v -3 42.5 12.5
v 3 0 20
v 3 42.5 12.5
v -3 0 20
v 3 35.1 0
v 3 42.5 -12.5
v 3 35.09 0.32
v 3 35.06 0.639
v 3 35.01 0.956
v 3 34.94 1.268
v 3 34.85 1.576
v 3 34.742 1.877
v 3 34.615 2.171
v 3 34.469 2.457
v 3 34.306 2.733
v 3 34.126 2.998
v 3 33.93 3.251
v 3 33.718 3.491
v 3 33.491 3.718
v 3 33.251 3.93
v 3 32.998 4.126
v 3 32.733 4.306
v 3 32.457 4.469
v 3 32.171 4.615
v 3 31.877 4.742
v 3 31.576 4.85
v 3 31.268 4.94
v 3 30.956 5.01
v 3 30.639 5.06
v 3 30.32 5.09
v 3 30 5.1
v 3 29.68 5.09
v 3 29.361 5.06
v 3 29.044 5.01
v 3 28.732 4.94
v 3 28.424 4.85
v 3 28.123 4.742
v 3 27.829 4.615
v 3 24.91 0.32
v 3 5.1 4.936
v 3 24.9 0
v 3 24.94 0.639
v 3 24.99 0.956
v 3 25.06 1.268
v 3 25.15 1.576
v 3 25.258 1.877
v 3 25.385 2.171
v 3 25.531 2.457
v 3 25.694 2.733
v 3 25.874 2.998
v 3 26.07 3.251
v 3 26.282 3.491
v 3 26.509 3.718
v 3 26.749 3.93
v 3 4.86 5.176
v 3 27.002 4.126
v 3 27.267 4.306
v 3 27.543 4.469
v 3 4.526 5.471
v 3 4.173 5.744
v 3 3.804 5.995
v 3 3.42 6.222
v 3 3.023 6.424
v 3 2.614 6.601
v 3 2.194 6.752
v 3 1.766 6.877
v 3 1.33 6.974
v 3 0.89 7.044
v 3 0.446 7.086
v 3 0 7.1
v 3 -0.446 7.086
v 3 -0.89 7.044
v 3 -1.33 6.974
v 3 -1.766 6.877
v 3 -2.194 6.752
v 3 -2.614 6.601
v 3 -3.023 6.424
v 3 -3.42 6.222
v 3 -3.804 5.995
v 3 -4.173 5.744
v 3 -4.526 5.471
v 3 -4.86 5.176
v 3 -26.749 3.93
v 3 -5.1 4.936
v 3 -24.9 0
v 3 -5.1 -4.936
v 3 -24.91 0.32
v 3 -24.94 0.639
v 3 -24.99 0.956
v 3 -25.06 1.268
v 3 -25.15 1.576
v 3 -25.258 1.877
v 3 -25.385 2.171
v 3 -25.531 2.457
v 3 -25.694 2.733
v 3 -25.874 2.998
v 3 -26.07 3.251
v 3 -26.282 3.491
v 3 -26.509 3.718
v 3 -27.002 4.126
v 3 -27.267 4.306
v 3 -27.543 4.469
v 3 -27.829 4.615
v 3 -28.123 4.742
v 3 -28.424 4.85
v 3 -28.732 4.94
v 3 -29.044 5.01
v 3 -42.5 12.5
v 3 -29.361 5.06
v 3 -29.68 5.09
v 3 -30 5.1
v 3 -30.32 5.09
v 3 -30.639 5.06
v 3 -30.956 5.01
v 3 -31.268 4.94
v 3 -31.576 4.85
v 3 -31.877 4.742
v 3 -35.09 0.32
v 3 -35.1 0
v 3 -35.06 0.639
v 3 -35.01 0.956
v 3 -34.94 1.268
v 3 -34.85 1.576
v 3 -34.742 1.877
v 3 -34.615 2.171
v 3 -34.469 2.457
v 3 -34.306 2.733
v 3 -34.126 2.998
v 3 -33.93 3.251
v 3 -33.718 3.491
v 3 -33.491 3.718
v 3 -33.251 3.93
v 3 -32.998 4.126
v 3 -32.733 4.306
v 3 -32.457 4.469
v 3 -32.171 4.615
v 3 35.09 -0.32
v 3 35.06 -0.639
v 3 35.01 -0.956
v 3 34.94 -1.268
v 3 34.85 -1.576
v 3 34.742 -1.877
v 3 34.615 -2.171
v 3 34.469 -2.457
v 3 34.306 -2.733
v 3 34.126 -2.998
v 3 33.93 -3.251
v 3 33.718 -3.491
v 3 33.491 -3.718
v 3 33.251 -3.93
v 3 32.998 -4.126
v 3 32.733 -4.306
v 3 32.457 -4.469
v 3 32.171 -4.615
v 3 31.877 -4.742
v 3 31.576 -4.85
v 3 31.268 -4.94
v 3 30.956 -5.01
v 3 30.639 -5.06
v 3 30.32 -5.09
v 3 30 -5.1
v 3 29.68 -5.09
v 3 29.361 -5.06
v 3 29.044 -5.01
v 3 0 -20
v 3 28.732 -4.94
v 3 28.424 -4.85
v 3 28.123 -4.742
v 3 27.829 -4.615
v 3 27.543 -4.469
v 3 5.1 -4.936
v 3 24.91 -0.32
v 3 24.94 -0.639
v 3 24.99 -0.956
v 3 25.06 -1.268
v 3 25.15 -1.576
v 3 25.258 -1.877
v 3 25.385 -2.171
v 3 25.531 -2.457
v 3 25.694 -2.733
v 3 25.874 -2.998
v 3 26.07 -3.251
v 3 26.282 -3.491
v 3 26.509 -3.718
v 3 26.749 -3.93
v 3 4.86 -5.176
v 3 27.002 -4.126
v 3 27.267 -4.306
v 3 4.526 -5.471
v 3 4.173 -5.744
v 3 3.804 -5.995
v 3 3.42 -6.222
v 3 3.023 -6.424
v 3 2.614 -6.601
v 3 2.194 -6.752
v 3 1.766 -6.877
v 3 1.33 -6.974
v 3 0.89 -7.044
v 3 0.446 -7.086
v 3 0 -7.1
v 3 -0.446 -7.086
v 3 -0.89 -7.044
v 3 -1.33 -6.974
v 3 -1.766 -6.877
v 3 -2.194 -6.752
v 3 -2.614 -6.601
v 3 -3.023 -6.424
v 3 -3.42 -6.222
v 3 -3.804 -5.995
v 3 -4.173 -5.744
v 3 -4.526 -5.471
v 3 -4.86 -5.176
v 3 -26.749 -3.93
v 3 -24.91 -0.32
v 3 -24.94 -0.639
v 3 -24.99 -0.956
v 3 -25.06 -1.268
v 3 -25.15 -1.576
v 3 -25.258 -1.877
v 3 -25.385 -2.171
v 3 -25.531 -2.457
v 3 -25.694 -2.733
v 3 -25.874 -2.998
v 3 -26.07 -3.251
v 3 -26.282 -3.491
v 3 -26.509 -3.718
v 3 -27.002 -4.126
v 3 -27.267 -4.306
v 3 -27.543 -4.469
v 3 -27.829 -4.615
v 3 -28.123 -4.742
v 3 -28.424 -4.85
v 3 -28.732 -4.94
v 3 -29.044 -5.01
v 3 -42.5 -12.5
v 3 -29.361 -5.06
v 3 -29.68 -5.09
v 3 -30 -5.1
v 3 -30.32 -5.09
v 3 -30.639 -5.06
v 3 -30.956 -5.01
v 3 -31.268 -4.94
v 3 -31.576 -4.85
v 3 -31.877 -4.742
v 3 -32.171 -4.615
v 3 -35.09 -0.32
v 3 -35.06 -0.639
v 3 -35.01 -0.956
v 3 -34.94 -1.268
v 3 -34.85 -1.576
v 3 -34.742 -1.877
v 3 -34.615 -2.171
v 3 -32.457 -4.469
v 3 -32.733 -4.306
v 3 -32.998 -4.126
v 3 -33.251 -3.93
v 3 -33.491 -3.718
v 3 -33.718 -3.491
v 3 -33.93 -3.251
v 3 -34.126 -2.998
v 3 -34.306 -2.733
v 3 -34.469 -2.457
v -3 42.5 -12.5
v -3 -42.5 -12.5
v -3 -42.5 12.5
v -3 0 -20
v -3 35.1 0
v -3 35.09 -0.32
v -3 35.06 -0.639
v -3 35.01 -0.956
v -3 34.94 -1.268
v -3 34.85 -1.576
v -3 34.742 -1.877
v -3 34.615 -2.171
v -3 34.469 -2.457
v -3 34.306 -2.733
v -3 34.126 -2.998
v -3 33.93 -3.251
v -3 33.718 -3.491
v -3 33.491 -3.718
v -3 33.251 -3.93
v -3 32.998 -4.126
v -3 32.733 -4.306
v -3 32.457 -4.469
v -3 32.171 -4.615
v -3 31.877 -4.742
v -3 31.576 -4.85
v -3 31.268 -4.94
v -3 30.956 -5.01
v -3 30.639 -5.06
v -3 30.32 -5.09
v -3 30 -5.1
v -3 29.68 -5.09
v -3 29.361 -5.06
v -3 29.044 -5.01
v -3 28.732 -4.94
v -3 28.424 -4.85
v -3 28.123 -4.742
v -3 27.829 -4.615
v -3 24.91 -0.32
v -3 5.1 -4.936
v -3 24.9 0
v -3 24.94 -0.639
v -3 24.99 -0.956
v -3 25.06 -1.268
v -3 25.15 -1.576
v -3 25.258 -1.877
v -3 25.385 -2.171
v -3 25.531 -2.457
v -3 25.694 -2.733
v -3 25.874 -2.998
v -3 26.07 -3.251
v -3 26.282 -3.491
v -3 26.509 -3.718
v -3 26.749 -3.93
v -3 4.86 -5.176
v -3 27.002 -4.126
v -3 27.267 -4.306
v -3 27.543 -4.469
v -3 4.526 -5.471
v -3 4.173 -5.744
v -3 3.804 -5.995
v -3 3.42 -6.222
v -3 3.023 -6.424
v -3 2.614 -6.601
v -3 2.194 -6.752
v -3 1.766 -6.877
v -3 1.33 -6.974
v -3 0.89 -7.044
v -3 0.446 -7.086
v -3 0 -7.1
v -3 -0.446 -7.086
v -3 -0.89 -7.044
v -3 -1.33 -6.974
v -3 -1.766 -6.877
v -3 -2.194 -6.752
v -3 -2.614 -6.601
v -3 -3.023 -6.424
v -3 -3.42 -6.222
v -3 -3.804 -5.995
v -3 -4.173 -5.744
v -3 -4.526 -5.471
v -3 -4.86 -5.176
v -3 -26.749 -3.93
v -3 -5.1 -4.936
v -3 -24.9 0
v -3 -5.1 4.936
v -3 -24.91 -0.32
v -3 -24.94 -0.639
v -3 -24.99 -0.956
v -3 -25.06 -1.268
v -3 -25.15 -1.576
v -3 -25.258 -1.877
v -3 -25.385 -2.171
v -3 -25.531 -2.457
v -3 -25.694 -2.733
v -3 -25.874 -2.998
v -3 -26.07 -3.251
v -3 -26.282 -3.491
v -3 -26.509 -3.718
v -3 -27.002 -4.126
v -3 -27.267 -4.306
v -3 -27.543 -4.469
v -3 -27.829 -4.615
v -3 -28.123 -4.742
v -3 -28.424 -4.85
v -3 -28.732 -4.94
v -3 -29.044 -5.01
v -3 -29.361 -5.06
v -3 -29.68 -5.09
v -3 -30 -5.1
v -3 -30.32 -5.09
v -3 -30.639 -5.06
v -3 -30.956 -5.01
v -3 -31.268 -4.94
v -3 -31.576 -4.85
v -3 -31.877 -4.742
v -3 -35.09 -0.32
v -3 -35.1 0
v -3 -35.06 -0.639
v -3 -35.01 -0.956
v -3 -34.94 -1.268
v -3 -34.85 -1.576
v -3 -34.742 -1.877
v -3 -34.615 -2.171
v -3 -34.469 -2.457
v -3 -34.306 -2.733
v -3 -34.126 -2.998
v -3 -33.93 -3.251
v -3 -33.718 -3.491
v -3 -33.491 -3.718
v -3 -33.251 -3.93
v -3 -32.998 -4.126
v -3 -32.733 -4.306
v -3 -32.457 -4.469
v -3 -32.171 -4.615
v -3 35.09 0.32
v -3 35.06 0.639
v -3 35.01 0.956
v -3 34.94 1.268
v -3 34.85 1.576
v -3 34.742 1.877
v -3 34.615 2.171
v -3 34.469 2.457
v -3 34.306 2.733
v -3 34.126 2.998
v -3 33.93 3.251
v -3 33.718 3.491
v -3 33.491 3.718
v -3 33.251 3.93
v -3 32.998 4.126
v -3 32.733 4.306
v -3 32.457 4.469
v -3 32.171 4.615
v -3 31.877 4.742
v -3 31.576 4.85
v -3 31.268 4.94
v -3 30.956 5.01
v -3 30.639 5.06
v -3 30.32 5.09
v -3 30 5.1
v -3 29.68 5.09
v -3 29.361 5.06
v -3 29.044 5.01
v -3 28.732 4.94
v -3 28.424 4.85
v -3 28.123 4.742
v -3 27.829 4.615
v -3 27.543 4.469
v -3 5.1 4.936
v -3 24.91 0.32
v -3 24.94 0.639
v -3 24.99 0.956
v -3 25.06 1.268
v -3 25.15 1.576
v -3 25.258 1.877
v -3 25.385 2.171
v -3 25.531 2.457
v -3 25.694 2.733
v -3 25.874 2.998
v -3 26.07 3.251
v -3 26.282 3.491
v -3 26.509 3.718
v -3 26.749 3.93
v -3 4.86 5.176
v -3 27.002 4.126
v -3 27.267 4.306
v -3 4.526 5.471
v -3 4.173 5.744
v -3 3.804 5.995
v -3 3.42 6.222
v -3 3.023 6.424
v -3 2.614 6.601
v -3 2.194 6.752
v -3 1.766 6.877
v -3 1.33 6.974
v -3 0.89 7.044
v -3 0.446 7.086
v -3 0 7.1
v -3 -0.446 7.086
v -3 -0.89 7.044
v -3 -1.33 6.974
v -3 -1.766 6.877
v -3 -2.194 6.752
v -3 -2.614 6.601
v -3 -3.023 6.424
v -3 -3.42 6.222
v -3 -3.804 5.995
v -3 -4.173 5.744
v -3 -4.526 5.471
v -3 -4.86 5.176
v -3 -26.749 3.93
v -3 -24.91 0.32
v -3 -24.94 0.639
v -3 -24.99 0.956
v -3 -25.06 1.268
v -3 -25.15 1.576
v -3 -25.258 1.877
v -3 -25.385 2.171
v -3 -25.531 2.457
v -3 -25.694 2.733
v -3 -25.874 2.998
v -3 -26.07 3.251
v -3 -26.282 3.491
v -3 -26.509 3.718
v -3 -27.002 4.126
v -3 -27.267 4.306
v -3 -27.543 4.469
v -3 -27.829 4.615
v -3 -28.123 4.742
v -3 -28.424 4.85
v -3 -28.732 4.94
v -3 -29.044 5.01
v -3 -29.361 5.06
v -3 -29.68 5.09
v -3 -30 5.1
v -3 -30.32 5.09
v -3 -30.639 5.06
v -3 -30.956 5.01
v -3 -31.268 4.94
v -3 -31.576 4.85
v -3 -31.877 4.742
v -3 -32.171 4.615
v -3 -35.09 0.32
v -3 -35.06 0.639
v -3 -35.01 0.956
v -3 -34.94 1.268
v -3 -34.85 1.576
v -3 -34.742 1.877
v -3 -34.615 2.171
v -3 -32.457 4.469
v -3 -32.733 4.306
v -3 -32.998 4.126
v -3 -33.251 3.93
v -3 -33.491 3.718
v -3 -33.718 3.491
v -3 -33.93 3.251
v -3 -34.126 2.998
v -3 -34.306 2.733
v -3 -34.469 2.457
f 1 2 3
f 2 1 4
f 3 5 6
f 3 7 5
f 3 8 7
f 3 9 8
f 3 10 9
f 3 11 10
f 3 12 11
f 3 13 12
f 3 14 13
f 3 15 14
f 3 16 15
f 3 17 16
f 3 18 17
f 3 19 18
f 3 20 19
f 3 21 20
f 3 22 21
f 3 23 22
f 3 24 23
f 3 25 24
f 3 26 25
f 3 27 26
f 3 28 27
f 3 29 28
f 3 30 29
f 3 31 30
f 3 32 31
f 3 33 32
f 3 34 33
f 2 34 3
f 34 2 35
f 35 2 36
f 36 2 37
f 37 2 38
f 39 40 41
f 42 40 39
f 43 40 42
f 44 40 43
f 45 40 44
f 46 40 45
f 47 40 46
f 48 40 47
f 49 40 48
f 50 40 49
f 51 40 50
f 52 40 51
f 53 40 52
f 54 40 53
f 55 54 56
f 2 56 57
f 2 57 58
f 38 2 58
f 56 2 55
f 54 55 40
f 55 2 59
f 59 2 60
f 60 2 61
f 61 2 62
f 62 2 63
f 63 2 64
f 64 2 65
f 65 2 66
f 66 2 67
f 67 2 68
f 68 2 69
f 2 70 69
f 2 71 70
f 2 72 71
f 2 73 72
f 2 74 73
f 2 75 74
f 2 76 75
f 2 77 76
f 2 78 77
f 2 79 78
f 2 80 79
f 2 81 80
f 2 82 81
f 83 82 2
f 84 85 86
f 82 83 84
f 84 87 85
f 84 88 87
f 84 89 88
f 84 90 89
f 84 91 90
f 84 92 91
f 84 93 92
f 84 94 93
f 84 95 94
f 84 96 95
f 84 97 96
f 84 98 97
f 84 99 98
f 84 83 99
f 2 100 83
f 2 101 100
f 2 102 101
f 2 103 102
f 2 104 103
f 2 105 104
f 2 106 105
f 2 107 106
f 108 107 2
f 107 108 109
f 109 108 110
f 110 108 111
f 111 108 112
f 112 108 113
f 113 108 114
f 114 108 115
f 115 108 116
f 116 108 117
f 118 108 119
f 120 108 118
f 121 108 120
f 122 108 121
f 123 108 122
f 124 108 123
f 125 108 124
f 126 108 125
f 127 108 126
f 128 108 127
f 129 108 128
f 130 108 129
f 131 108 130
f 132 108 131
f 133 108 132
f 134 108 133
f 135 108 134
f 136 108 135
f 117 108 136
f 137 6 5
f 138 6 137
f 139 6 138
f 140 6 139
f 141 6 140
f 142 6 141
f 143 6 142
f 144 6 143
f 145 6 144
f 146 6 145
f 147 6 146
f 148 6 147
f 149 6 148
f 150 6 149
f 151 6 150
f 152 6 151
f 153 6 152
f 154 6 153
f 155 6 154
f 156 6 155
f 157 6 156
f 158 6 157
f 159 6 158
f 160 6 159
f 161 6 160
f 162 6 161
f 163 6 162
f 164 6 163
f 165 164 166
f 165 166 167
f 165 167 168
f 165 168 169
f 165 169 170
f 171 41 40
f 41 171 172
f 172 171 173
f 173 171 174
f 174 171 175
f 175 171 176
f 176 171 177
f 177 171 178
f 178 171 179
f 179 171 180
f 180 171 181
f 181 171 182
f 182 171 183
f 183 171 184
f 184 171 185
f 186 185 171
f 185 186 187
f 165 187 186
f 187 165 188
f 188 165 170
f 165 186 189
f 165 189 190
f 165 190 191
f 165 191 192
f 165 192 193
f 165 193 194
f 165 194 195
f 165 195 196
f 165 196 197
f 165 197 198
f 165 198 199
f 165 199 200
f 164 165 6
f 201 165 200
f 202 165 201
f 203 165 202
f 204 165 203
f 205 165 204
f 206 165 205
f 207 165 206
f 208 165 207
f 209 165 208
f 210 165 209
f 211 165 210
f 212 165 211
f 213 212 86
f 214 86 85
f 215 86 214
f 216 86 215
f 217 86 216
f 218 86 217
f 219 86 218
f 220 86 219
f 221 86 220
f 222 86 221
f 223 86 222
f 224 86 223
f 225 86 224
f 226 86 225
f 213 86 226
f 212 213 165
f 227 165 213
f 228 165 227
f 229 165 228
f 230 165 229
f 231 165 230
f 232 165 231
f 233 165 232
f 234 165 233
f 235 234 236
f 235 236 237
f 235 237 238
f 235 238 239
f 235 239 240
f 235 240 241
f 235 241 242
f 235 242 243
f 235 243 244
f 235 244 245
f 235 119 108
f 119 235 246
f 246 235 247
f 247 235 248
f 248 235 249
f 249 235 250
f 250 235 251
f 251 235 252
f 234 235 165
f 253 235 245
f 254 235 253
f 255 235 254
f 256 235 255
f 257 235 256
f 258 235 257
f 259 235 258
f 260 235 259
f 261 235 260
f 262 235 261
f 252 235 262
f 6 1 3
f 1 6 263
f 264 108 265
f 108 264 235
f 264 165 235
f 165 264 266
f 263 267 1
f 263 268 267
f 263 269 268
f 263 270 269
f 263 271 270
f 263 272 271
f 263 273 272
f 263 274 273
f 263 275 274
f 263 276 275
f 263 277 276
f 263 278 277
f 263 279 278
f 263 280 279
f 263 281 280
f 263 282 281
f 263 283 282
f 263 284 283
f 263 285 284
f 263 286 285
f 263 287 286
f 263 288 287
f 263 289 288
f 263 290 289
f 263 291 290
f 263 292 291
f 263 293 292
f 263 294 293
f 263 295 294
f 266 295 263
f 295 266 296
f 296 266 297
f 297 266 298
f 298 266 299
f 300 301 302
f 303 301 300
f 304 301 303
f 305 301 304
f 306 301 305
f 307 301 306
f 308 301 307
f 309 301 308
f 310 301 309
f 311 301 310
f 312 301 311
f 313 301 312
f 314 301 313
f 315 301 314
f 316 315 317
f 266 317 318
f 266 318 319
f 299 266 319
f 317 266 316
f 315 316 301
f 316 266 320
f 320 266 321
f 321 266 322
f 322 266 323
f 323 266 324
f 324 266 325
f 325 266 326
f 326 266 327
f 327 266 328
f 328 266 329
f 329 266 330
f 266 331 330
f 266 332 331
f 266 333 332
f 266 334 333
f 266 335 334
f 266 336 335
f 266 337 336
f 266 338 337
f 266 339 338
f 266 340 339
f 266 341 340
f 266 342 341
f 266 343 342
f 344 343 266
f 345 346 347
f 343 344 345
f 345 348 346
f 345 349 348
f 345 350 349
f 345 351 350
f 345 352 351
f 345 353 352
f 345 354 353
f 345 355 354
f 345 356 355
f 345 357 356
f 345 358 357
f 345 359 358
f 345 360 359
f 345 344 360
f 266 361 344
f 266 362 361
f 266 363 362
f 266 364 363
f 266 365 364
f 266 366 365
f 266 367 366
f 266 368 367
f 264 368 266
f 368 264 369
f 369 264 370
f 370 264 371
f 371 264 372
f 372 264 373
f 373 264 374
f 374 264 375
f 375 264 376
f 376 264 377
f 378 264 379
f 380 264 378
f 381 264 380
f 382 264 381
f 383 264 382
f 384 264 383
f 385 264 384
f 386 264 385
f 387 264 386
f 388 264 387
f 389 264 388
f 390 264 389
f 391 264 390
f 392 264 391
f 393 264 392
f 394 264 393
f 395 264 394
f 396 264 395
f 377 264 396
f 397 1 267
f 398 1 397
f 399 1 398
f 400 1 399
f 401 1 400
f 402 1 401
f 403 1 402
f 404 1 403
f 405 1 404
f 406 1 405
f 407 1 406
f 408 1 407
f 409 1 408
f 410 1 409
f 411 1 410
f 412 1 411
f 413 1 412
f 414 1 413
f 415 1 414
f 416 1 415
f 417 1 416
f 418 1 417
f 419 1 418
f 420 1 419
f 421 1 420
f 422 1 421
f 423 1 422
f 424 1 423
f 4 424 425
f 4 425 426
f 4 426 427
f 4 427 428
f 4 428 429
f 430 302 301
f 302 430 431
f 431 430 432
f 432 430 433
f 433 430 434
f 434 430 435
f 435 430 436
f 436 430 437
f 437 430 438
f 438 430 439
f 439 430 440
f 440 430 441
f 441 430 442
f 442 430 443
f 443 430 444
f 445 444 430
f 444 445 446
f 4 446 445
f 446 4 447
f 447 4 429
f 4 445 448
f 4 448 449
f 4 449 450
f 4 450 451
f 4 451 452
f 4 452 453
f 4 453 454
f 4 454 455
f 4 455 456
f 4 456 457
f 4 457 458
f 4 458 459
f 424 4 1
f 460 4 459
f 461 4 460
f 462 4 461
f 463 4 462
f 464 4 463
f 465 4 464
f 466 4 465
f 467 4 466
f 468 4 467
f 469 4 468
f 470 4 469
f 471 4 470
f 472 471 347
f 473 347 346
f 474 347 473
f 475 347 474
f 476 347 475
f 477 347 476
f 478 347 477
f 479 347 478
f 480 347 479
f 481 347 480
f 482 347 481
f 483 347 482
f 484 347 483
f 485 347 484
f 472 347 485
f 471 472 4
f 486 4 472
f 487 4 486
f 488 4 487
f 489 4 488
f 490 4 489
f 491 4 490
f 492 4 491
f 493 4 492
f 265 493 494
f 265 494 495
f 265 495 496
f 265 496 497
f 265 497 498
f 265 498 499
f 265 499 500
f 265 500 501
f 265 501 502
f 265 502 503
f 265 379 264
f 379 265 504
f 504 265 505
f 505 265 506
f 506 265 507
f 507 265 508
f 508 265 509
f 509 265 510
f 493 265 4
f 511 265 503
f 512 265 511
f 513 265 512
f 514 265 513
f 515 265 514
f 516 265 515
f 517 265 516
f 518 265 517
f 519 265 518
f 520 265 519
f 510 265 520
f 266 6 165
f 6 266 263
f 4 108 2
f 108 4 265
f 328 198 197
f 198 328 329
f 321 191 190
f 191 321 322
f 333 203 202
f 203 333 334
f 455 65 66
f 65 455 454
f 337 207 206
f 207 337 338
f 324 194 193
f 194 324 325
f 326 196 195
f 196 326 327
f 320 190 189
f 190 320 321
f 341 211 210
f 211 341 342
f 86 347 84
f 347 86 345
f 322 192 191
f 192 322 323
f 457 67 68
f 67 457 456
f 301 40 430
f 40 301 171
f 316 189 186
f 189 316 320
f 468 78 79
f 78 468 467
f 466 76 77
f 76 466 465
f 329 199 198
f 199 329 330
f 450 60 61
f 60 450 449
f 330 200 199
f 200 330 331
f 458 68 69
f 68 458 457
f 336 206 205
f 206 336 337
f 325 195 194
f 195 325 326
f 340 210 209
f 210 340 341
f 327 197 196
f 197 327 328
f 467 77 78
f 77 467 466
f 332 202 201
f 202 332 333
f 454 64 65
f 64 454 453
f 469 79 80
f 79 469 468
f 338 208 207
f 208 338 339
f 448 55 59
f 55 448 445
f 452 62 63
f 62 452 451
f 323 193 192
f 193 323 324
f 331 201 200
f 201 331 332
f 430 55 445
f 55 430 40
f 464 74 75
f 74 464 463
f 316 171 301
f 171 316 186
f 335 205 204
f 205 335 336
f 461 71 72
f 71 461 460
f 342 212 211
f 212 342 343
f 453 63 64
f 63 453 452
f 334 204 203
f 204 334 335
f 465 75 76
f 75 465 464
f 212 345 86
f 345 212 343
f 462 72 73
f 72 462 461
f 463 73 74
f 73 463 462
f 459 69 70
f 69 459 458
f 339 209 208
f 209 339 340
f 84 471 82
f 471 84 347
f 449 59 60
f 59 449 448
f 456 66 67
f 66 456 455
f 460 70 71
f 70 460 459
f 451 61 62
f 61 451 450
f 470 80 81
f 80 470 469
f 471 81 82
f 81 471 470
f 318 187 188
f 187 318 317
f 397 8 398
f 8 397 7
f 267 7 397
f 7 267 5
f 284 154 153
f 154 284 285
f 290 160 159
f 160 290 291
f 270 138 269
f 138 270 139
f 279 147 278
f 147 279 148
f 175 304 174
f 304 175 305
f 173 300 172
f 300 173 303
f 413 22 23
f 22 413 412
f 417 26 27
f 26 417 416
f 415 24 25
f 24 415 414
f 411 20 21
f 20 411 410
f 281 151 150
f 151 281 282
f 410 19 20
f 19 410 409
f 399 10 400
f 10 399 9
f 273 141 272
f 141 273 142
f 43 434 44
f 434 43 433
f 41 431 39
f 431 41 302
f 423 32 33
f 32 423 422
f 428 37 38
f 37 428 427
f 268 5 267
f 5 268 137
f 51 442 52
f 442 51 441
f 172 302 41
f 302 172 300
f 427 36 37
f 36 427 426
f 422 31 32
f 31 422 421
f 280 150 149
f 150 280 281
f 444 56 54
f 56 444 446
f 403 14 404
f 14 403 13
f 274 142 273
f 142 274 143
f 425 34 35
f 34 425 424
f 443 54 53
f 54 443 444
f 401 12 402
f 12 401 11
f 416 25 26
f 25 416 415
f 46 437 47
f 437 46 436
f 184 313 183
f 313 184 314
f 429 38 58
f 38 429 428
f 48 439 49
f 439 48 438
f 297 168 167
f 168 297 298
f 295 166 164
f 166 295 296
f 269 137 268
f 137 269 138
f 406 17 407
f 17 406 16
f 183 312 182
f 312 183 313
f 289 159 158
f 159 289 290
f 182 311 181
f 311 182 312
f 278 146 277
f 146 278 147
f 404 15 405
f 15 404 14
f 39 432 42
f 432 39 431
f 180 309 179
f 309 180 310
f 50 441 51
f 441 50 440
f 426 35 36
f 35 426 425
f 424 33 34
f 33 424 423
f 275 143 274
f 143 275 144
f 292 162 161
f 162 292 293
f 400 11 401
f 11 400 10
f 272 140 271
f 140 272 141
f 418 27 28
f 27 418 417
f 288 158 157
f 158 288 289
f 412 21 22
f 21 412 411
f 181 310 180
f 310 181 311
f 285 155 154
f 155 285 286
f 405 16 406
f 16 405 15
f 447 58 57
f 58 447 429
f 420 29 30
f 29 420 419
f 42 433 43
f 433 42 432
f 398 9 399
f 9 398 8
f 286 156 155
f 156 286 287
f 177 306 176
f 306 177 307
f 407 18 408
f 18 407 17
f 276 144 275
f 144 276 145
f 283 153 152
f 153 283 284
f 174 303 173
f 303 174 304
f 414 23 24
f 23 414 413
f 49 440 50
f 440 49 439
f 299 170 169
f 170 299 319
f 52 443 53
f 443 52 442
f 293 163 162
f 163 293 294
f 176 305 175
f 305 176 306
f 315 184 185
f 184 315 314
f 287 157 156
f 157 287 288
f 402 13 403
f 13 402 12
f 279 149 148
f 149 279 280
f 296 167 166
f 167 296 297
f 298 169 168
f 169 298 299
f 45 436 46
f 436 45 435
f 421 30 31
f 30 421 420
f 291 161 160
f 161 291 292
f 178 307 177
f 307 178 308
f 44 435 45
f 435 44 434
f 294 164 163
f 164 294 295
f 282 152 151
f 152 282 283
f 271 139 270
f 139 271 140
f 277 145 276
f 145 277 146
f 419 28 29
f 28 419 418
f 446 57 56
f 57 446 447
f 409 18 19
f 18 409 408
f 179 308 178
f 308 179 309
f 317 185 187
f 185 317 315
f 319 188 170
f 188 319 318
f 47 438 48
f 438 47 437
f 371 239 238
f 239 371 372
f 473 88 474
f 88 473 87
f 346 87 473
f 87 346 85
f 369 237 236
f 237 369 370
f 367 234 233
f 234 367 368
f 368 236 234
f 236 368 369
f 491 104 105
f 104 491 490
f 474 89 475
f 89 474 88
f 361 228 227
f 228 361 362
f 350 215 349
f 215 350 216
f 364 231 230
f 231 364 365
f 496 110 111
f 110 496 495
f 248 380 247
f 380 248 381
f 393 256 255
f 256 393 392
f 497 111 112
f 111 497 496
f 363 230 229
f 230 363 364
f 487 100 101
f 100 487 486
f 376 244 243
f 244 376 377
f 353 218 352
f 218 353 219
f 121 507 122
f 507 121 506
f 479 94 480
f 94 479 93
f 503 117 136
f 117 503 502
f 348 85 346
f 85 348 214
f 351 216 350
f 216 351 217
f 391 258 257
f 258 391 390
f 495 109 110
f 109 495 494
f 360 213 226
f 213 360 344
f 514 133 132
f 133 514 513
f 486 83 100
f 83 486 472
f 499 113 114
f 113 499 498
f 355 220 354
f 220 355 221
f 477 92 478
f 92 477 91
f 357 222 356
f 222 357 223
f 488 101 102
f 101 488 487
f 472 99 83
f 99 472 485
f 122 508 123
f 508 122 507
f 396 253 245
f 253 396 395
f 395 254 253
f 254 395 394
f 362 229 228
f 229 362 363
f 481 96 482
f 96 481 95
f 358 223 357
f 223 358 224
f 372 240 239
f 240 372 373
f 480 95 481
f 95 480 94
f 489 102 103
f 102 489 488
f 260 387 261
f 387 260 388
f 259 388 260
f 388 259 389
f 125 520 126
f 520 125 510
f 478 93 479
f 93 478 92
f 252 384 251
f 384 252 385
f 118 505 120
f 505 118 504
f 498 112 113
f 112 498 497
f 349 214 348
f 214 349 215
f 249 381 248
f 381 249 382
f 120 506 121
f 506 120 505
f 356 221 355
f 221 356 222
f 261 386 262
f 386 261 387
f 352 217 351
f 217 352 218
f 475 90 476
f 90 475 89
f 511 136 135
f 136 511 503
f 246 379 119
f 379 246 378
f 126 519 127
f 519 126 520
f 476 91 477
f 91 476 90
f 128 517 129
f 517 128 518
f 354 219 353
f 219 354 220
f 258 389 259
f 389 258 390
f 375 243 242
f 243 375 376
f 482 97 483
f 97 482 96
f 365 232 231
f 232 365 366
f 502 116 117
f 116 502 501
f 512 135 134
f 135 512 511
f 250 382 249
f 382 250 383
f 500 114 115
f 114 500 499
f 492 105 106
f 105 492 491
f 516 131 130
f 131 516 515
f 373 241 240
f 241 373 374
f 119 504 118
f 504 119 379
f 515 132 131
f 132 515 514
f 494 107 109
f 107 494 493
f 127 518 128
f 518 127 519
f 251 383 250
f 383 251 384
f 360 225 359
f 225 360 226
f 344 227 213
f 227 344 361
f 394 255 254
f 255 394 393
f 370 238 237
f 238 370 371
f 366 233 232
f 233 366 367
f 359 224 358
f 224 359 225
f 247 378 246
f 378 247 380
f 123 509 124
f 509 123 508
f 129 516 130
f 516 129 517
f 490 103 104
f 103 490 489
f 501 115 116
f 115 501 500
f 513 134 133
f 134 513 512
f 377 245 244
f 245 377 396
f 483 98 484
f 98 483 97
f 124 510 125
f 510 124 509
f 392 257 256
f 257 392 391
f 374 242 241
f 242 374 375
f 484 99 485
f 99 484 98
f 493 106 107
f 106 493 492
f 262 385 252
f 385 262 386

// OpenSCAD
// file: ../config/parameters.scad
// Global Chassis Dimensions
chassis_width = 750;   
chassis_length = 1000;
drill_pattern_widths = [750, 650, 550];
drill_pattern_lengths = [750, 850, 1000];
base_plate_length = 1300;
connect_plate_thick = 10; 

// Beam Profile (Purchased Part)
beam_profile = 40;
beam_thickness = 3;    
beam_length = 1000;

// Upright & Cover
upright_height = 500;
top_side_width = 60;
cover_thick = 5;
cover_clearance = 10;  
cover_overlap = 10;
cover_total_height = 530; 

// Resolution & Preview
$fn = 60; 
exploded_view = false; 
explosion_dist = 800; 

// Motor & Wheel Data
tire_dia = 430;
tire_width = 100;
hub_dia = 160;
hub_width = 140; //specs from Quinder are: Fork width for mounting: 138mm
axle_dia = 10.2; //specs from Quinder are: Mounting hole: max 10.2mm
bolt_dia = 14.2;

// Bracket Geometry universal
bracket_thick = 6;
bracket_bolt_diameter = 10.2;       
tire_clearance = 130;      
side_plate_top_width = 200;
side_plate_width = 200;

//Side plate
axle_bottom_dist = 35;
extra_space_bracket = 30;
side_hole_margin = 75;

//top plate
bracket_top_hole_dist_x = 80; // De totale gewenste afstand over de X-as
bracket_top_hole_dist_y = 130; // De totale gewenste afstand over de Y-as


arm_height = (tire_dia / 2) + tire_clearance;
inner_width = hub_width;
bracket_total_width = inner_width + (extra_space_bracket*2) + (2 * bracket_thick);
bracket_top_z = arm_height + bracket_thick;

// Axle bracket
axle_hex_width = 85;          
axle_hex_height = 40;
axle_hex_straight_part = 25;   
axle_bracket_thickness = 6;    

axle_hole_diameter = 10.2;
axle_hole_distance = 30;

axle_flat_width = axle_dia; // Gebruikt 10.2 uit parameters 
axle_round_dia = bolt_dia;  // Gebruikt 14.2 uit parameters
// main file
include <../config/parameters.scad>

axle_bracket_part();

module axle_bracket_part() {
    $fn = 100;
    rotate([90, 0, 90]) 
    difference() {
        linear_extrude(height = axle_bracket_thickness, center = true) {
            polygon(points=[
                [axle_hex_width/2,  axle_hex_straight_part/2],  
                [axle_hex_width/2, -axle_hex_straight_part/2],  
                [0,             -axle_hex_height/2],      
                [-axle_hex_width/2, -axle_hex_straight_part/2], 
                [-axle_hex_width/2,  axle_hex_straight_part/2], 
                [0,              axle_hex_height/2]
            ]);
        }

        linear_extrude(height = axle_bracket_thickness + 2, center = true) {
            intersection() {
                circle(d = bolt_dia);
                square([axle_dia, bolt_dia + 2], center = true);
            }
        }

        translate([axle_hole_distance, 0, 0])
            cylinder(d = axle_hole_diameter, h = axle_bracket_thickness + 2, center = true);

        translate([-axle_hole_distance, 0, 0])
            cylinder(d = axle_hole_diameter, h = axle_bracket_thickness + 2, center = true);
    }
}
